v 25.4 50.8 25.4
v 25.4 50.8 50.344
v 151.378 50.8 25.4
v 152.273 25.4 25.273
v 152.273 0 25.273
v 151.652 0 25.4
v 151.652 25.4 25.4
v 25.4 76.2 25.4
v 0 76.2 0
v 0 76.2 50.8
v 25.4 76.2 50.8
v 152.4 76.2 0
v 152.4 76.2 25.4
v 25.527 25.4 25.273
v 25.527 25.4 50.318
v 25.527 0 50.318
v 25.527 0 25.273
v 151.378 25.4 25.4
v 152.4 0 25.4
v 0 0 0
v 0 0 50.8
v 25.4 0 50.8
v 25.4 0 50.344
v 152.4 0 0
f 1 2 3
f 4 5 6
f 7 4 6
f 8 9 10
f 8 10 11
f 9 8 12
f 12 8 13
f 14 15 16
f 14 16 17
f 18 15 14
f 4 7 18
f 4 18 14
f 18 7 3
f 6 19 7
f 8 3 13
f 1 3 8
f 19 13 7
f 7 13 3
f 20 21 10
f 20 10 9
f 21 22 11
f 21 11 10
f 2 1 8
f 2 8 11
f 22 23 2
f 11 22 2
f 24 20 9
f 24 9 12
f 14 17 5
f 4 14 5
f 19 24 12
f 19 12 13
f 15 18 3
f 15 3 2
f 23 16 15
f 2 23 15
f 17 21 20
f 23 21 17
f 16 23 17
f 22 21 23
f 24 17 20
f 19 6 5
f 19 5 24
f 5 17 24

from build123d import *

# Parameters (mm, degrees)
F1_DEPTH = 76.2
F3_DEPTH = 50.8
F5_DEPTH = 25.4


with BuildPart() as f1:
    # F0 (on Front) → F1 (new body)
    with BuildSketch(Plane.XZ):
        Polygon((0, 50.8), (0, 0), (152.4, 0), (152.4, 25.4), (25.4, 25.4), (25.4, 50.8), align=None)
    extrude(amount=-F1_DEPTH)

    # F2 (on Front) → F3 (join)
    with BuildSketch(Plane.XZ):
        Polygon((25.018999, 50.418999), (25.018999, 25.273001), (152.018994, 25.273001), align=None)
    extrude(amount=-F3_DEPTH)

    # F4 (on Front) → F5 (cut)
    with BuildSketch(Plane.XZ):
        Polygon((152.272999, 25.273001), (25.527, 51.181), (25.527, 25.273001), (28.067, 25.273001), align=None)
    extrude(amount=-F5_DEPTH, mode=Mode.SUBTRACT)


solid = f1.part
